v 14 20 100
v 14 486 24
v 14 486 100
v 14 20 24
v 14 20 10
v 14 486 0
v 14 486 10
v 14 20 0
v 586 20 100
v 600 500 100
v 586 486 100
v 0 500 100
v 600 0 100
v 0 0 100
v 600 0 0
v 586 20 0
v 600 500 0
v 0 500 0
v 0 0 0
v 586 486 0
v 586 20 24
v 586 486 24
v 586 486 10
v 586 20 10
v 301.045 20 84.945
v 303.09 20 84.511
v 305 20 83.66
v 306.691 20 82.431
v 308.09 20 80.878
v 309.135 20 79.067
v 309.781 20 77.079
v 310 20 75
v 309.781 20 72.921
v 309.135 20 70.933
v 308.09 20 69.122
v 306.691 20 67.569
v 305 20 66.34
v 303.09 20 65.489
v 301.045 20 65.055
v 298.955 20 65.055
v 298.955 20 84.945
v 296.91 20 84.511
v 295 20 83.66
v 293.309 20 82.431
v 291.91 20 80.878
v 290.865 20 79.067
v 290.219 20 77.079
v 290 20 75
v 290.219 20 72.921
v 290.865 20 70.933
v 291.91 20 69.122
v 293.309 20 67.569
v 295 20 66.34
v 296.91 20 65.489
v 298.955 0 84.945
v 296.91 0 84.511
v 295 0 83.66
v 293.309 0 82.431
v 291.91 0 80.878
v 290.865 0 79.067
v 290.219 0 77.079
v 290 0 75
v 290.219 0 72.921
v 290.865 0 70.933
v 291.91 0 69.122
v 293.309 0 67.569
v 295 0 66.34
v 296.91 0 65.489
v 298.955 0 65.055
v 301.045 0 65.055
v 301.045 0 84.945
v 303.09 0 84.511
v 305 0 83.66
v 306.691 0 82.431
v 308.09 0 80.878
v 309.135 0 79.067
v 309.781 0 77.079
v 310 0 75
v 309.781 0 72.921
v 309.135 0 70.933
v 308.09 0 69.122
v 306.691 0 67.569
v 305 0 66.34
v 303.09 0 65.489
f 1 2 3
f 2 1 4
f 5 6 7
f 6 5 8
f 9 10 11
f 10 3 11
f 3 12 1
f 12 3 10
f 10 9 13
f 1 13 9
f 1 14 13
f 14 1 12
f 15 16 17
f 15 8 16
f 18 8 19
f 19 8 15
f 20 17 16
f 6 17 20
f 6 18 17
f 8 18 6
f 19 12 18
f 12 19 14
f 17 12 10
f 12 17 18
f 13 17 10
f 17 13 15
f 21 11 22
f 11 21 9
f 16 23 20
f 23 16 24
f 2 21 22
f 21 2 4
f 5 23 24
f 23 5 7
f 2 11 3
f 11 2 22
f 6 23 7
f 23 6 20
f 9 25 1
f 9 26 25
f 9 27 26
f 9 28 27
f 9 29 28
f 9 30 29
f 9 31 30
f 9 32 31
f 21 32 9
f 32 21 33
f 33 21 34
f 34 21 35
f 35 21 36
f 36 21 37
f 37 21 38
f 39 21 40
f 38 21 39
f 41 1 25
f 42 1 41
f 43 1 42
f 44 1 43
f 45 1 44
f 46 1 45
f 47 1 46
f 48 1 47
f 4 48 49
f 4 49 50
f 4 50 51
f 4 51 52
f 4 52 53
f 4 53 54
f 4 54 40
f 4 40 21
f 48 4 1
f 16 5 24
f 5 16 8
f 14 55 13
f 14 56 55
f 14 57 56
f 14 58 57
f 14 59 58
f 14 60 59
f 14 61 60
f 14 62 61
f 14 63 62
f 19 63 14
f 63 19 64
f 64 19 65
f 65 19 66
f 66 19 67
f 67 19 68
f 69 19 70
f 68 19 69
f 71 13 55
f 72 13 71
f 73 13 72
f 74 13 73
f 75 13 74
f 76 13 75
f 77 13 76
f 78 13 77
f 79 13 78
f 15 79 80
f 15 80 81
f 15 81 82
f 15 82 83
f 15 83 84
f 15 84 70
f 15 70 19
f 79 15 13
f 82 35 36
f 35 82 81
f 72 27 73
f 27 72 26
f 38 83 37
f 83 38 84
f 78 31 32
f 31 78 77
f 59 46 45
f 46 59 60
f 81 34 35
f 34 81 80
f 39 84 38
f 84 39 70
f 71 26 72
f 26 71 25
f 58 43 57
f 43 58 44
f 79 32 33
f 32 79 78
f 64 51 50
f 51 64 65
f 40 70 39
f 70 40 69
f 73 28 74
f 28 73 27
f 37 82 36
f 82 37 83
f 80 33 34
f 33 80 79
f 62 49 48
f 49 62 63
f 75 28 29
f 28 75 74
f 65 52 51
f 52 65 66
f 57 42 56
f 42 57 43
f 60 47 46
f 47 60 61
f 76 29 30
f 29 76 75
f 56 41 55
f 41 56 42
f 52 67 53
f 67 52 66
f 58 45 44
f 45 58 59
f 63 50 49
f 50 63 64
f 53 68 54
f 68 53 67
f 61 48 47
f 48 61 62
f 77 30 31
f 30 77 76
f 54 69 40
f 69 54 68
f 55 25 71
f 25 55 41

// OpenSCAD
/*

    Dovetail Drawer
    
    By Anton Augustsson


*/

// use dovtail library

module dovetailDrawer (
    thicknessBottom,
    thicknessSide,
    thicknessFront,
    length,
    width,
    height,
    x,y,z,
    xRotate
    ){
/*
    ---------- Local varibles ---------- 
*/



/*
    ---------- Code ---------- 
*/
rotate([xRotate,0,0])
difference () {
union () {

// Left
color("Wheat")
translate([
    0,
    thicknessFront/4,
    0]) 
cube(size = [
    thicknessSide,
    length-thicknessFront/4,
    height]);

// Right
color("Wheat")
translate([
    width-thicknessSide,
    thicknessFront/4,
    0]) 
cube(size = [
    thicknessSide,
    length-thicknessFront/4,
    height]);
    
// Bottom 
color("Wheat")
translate([
    thicknessSide/2,
    thicknessFront,
    10]) 
cube(size = [
    width-thicknessSide,
    length-thicknessFront-thicknessSide,
    thicknessBottom]);

// Back
color("Wheat")
translate([
    0,
    length-thicknessSide,
    0]) 
cube(size = [
    width,
    thicknessSide,
    height]);

// Front
color("BurlyWood")
translate([
    0,
    0,
    0]) 
cube(size = [
    width,
    thicknessFront,
    height]);    
}


translate([
    width/2,                   
    -1,   
    height/4*3
    ])  
rotate([270,0,0])
cylinder(
    h = thicknessFront+2,    
    r = 10        
    );      

}}
    
/*
    ---------- Example ---------- 
*/


thicknessBottom = 14;
thicknessSide   = 14;
thicknessFront  = 20;

length = 500;
width  = 600;
height = 100;


x=0;
y=0;
z=0;
xRotate=0;

dovetailDrawer (
    thicknessBottom,
    thicknessSide,
    thicknessFront,
    length,
    width,
    height,
    x,y,z,
    xRotate
    );
